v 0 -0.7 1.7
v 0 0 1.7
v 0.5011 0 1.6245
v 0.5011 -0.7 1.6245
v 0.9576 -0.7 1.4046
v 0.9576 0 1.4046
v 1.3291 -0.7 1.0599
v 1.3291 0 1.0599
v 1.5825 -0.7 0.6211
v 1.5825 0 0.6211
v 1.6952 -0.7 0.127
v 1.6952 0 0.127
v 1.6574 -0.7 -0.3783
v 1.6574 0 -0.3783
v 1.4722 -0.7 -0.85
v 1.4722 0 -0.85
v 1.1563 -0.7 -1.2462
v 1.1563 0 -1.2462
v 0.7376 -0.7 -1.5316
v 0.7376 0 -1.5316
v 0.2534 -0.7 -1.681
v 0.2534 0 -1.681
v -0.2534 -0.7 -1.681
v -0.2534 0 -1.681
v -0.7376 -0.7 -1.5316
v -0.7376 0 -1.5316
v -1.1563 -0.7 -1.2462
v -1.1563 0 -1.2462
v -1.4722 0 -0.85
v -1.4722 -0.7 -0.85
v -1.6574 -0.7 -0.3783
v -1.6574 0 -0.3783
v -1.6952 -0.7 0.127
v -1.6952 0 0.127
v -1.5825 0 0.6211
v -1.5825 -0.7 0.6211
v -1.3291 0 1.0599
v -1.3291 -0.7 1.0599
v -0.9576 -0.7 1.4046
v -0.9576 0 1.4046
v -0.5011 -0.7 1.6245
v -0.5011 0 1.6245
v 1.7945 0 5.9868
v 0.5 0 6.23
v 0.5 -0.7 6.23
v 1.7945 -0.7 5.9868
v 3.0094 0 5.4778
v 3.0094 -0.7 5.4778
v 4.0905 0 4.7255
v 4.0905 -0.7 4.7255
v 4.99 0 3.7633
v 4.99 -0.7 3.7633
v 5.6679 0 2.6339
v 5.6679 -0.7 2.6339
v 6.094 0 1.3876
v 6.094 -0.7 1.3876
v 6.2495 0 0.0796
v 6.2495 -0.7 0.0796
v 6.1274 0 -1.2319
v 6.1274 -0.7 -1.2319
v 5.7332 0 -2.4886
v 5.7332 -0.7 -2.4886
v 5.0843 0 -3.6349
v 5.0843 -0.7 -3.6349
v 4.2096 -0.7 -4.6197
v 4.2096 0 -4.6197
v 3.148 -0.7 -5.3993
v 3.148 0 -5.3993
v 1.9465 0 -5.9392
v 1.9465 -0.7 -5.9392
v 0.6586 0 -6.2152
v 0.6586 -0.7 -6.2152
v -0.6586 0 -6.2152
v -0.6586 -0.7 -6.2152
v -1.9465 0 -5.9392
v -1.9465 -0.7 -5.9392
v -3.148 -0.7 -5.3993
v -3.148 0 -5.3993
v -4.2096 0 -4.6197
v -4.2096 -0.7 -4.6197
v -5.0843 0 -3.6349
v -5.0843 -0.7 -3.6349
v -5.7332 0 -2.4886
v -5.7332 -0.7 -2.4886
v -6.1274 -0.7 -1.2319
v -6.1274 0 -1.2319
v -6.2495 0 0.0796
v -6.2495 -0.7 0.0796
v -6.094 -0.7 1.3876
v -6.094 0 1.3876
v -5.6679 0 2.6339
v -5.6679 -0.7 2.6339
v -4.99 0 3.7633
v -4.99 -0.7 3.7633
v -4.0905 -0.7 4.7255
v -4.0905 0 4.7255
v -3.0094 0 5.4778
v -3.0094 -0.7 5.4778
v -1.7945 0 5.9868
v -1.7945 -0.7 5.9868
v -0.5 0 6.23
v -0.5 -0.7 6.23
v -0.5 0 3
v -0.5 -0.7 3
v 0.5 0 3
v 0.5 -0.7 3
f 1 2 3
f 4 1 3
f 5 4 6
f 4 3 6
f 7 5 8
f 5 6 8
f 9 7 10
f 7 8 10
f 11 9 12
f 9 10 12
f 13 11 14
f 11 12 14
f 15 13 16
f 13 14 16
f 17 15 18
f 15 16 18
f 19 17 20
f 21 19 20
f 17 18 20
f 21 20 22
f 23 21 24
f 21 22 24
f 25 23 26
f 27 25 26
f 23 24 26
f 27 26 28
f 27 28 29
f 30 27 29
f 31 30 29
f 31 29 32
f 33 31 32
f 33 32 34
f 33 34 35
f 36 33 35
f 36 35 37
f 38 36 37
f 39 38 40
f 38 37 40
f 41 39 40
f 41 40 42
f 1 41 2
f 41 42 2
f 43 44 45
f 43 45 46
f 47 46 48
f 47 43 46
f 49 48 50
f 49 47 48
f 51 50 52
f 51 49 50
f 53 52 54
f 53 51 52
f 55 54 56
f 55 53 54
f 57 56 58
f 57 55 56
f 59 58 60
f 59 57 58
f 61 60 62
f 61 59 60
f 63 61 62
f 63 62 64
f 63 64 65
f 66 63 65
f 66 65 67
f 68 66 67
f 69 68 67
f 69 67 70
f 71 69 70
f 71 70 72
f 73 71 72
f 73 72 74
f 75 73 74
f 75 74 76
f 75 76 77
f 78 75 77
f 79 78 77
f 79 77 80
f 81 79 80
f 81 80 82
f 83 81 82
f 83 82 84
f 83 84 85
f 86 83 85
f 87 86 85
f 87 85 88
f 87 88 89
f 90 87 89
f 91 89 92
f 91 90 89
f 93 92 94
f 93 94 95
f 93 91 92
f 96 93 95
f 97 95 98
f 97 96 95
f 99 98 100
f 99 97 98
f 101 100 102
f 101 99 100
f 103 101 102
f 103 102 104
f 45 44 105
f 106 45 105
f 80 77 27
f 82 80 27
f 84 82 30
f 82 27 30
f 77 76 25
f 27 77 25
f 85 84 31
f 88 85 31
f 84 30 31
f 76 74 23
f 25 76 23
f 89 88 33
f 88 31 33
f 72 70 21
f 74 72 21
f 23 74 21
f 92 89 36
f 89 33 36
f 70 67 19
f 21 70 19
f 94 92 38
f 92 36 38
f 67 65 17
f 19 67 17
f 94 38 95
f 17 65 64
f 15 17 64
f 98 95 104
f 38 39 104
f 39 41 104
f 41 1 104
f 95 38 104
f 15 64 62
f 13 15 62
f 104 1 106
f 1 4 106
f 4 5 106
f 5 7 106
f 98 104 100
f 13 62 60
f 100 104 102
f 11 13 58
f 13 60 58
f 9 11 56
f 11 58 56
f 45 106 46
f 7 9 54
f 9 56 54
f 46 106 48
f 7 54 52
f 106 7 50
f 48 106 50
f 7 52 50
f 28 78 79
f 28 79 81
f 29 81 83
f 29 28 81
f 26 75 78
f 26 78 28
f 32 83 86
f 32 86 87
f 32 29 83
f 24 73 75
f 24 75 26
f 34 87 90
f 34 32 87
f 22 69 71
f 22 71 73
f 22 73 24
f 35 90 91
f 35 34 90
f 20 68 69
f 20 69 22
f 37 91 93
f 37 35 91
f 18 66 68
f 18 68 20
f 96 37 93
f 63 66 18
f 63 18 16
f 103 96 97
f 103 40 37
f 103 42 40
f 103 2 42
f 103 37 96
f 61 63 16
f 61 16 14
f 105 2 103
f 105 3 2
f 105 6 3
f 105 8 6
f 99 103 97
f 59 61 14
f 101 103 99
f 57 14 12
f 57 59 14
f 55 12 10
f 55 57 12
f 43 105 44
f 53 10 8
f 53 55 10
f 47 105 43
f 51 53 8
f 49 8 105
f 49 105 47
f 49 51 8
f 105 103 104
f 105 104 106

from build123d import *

# Parameters (mm, degrees)
SKETCH1_R          = 6.25
BASE_FLANGE1_DEPTH = 0.7
SKETCH4_W          = 1
SKETCH4_H          = 3.25
CUT_EXTRUDE1_DEPTH = 0.7
SKETCH5_R          = 1.7
CUT_EXTRUDE2_DEPTH = 0.7


# Sheet-metal steps are written as plain solids
with BuildPart() as part:
    # Sketch1 → Base-Flange1 (new body)
    with BuildSketch(Plane(origin=(0, 0, 0), x_dir=(1, 0, 0), z_dir=(0, 1, 0))):
        with Locations(Location((0, 0, 0), (0, 0, 270))):
            Circle(SKETCH1_R)
    extrude(amount=-BASE_FLANGE1_DEPTH)

    # Sketch4 → Cut-Extrude1 (cut)
    with BuildSketch(Plane(origin=(0, 0, 0), x_dir=(1, 0, 0), z_dir=(0, 1, 0))):
        with Locations((0, -4.625)):
            Rectangle(SKETCH4_W, SKETCH4_H)
    extrude(amount=-CUT_EXTRUDE1_DEPTH, mode=Mode.SUBTRACT)

    # Sketch5 → Cut-Extrude2 (cut)
    with BuildSketch(Plane(origin=(0, 0, 0), x_dir=(1, 0, 0), z_dir=(0, 1, 0))):
        with Locations(Location((0, 0, 0), (0, 0, 270))):
            Circle(SKETCH5_R)
    extrude(amount=-CUT_EXTRUDE2_DEPTH, mode=Mode.SUBTRACT)


solid = part.part
